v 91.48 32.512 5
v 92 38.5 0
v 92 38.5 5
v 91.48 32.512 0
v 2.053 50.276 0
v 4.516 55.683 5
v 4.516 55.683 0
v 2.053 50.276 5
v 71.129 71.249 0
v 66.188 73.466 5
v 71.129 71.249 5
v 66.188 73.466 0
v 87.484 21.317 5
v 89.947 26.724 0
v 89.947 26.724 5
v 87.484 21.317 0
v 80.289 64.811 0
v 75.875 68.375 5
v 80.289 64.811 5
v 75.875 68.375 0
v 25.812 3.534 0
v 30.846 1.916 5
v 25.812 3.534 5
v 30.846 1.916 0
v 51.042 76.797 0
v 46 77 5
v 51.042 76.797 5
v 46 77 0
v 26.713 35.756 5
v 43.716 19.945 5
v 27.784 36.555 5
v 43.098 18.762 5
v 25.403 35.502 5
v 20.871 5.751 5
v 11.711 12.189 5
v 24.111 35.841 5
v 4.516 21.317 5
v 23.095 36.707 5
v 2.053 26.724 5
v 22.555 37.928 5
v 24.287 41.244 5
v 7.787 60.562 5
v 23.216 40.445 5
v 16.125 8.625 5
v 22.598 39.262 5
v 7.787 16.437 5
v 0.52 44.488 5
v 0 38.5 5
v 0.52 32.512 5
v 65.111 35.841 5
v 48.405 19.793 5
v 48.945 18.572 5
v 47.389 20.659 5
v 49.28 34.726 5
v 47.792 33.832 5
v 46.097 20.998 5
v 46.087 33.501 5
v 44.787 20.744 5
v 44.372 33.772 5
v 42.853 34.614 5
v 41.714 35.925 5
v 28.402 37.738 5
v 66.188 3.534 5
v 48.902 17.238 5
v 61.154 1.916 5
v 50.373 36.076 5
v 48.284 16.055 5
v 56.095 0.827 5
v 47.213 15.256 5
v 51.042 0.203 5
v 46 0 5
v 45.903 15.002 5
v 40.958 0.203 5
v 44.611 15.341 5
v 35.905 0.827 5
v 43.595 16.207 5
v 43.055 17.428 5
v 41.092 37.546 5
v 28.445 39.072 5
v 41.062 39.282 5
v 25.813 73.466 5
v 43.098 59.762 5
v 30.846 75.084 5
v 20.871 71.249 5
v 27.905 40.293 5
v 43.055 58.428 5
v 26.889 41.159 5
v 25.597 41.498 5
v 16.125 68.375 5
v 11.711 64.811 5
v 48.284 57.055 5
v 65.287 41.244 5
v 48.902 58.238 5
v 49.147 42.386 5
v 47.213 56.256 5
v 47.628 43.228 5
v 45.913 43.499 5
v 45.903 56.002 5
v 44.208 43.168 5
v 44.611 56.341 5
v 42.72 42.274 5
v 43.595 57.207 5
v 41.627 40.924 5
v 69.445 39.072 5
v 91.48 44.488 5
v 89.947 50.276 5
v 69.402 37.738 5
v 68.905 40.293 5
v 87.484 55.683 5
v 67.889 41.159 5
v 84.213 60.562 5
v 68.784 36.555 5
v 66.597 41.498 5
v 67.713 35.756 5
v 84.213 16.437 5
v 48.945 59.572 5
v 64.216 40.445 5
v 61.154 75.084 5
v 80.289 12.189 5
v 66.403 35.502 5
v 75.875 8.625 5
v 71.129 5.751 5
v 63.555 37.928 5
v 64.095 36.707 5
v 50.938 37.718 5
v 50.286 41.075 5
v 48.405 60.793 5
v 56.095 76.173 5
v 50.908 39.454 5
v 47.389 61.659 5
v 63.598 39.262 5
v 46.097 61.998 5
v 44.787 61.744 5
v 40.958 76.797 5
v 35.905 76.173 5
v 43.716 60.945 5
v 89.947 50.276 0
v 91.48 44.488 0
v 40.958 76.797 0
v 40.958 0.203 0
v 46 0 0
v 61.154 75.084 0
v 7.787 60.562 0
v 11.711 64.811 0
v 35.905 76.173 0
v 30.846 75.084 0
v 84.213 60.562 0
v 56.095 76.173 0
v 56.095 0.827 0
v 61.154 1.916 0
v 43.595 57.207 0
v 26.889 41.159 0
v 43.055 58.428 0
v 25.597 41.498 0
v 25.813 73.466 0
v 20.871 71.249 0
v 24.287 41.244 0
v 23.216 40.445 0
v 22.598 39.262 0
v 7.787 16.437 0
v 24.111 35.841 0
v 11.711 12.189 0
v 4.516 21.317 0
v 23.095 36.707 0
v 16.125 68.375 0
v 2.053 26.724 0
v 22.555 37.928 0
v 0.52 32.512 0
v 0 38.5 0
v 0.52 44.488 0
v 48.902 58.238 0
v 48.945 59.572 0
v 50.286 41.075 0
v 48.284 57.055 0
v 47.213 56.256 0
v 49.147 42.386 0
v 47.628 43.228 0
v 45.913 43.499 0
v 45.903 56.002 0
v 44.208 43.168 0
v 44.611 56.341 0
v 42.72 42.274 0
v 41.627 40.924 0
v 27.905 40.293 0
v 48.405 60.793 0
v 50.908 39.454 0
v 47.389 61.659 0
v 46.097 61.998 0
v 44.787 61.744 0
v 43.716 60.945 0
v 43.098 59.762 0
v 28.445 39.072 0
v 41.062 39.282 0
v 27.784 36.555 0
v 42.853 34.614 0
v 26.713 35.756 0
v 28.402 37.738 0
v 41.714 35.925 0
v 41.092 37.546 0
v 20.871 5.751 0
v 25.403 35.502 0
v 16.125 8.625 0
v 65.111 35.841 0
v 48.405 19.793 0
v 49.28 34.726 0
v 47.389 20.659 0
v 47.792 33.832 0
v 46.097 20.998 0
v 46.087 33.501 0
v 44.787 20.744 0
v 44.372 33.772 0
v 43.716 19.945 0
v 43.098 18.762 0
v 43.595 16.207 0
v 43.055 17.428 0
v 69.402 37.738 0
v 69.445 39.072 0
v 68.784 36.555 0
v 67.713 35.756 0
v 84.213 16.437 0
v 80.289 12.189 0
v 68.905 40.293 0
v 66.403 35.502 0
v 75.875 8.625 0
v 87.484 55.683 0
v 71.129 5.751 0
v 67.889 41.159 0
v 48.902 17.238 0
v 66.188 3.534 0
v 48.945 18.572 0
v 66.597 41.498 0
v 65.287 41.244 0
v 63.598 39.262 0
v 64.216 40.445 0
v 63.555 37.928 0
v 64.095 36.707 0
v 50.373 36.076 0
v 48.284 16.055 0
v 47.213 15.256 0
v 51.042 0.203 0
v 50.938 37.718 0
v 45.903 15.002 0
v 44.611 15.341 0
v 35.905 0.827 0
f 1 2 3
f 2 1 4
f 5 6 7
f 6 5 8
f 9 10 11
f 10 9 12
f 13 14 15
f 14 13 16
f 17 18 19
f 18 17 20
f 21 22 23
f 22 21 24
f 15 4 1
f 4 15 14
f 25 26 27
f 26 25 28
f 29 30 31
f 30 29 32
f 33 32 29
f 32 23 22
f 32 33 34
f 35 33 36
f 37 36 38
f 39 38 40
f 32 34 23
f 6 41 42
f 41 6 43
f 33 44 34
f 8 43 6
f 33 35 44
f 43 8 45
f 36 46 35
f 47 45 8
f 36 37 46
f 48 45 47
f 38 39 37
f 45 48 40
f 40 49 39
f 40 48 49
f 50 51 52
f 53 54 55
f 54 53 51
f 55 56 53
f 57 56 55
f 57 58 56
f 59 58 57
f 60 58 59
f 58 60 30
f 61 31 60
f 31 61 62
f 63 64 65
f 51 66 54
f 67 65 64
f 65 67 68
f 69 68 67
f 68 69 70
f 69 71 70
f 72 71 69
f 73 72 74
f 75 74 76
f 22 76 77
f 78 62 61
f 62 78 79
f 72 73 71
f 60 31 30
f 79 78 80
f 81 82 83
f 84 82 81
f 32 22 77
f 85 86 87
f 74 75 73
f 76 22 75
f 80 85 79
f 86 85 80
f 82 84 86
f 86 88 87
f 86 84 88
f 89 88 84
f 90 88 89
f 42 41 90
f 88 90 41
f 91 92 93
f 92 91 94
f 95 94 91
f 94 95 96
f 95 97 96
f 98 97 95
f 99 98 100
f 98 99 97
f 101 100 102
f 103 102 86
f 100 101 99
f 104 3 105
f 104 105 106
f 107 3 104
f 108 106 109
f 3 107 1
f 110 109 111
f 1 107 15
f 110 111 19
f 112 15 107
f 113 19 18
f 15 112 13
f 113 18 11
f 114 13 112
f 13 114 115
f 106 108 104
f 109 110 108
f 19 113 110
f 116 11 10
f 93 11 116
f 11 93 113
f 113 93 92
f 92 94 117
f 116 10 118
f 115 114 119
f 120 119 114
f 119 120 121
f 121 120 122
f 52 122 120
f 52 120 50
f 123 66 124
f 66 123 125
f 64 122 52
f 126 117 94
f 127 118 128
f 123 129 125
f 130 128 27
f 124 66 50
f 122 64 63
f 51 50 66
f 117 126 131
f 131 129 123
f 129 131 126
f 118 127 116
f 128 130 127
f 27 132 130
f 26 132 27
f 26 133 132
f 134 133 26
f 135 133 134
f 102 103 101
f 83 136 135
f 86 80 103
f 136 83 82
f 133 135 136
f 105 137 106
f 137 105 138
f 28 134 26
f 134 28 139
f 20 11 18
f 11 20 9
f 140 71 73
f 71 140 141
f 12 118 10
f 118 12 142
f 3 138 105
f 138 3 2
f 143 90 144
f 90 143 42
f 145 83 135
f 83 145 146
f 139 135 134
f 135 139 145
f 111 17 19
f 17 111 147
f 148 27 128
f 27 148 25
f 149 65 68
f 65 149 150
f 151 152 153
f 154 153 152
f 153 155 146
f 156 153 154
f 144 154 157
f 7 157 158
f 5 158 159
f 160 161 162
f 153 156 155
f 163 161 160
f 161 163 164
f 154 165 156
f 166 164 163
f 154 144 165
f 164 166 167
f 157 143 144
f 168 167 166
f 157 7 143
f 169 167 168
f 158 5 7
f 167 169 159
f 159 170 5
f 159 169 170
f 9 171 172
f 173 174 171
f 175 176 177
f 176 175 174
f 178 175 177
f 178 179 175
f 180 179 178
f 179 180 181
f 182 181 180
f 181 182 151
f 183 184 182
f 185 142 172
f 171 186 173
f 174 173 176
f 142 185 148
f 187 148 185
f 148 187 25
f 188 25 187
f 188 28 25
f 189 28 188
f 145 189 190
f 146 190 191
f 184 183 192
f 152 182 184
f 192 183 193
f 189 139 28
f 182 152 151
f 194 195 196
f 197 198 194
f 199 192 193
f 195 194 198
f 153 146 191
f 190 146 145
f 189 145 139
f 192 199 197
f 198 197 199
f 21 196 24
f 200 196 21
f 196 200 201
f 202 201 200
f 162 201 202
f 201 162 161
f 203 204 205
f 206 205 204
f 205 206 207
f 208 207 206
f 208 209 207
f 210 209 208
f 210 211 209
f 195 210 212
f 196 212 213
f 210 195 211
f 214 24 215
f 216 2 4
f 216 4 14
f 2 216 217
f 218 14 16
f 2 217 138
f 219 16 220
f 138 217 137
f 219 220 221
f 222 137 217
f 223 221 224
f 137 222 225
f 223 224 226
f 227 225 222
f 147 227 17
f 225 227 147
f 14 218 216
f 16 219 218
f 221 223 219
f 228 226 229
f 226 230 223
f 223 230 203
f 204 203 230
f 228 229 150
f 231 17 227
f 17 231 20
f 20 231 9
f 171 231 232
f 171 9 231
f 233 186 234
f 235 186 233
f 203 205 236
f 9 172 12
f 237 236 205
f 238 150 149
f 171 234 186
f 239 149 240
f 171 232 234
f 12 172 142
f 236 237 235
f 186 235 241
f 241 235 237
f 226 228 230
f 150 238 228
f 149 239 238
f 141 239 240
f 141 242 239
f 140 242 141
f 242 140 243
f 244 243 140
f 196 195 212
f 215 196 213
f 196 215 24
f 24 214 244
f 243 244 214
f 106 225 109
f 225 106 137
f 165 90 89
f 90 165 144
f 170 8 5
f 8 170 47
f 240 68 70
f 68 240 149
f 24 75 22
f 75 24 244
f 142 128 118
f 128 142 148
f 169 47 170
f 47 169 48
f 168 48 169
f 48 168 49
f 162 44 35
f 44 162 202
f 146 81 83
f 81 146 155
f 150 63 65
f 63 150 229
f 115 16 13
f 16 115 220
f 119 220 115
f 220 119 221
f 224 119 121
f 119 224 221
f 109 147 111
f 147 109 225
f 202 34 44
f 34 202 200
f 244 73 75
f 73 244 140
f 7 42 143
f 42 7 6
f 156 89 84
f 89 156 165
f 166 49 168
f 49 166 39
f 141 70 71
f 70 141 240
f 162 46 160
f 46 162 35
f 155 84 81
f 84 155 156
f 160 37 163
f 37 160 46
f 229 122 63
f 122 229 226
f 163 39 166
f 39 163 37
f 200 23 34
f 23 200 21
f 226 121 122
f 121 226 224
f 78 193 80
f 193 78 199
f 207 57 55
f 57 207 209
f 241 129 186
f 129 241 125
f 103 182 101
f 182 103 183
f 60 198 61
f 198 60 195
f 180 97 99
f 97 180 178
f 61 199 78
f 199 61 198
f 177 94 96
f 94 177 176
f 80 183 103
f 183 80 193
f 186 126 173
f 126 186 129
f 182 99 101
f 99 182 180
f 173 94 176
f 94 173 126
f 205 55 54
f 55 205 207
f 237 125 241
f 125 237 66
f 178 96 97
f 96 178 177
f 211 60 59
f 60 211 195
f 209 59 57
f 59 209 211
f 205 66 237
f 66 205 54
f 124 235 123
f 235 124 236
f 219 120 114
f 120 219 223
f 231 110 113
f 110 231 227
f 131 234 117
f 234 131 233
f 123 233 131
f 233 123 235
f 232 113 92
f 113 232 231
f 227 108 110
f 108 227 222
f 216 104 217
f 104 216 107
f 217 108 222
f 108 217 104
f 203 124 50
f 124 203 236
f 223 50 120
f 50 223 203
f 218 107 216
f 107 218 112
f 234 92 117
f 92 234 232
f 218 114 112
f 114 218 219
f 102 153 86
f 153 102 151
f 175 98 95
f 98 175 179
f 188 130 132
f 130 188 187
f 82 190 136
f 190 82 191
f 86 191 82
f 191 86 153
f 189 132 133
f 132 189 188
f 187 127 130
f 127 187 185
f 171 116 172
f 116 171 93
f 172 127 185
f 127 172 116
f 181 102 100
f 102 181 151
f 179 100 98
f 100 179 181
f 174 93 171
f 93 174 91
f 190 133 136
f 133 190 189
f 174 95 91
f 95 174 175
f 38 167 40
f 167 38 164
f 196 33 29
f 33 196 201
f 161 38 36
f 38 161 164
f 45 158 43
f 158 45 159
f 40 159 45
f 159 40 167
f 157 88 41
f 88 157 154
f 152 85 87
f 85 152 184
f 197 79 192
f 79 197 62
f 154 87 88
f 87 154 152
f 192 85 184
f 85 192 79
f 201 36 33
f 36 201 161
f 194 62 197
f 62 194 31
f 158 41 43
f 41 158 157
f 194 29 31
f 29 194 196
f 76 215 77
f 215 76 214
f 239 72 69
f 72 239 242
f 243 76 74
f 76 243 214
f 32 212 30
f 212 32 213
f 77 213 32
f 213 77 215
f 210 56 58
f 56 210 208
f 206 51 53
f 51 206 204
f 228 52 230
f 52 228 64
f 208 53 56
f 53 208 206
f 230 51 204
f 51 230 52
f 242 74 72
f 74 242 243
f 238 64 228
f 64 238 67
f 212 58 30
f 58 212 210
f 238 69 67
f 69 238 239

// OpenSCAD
$fn = 32;

// ----------------------------------------------------------------------
// Cam plate: double_lobe cam, base R36
// ----------------------------------------------------------------------

// --- parameters (mm) ---
base_r = 36;              // base circle radius
lobe_h = 10;              // cam lobe rise
bore_r = 5;               // shaft bore radius
plate_t = 5;              // plate thickness, Z (extrusion height)
ring_r = 20.5;            // lightening ring radius
bolt_r = 3;               // lightening hole radius

profile = [[92, 38.5], [91.48, 44.488], [89.947, 50.276], [87.484, 55.683], [84.213, 60.562], [80.289, 64.811], [75.875, 68.375], [71.129, 71.249], [66.188, 73.466], [61.154, 75.084], [56.095, 76.173], [51.042, 76.797], [46, 77], [40.958, 76.797], [35.905, 76.173], [30.846, 75.084], [25.813, 73.466], [20.871, 71.249], [16.125, 68.375], [11.711, 64.811], [7.787, 60.562], [4.516, 55.683], [2.053, 50.276], [0.52, 44.488], [0, 38.5], [0.52, 32.512], [2.053, 26.724], [4.516, 21.317], [7.787, 16.437], [11.711, 12.189], [16.125, 8.625], [20.871, 5.751], [25.812, 3.534], [30.846, 1.916], [35.905, 0.827], [40.958, 0.203], [46, 0], [51.042, 0.203], [56.095, 0.827], [61.154, 1.916], [66.188, 3.534], [71.129, 5.751], [75.875, 8.625], [80.289, 12.189], [84.213, 16.437], [87.484, 21.317], [89.947, 26.724], [91.48, 32.512]];  // primary outline, 48 points, counter clockwise
void_1 = [[50.908, 39.454], [50.286, 41.075], [49.147, 42.386], [47.628, 43.228], [45.913, 43.499], [44.208, 43.168], [42.72, 42.274], [41.627, 40.924], [41.062, 39.282], [41.092, 37.546], [41.714, 35.925], [42.853, 34.614], [44.372, 33.772], [46.087, 33.501], [47.792, 33.832], [49.28, 34.726], [50.373, 36.076], [50.938, 37.718]];  // shaft bore, 18 points
void_2 = [[69.445, 39.072], [68.905, 40.293], [67.889, 41.159], [66.597, 41.498], [65.287, 41.244], [64.216, 40.445], [63.598, 39.262], [63.555, 37.928], [64.095, 36.707], [65.111, 35.841], [66.403, 35.502], [67.713, 35.756], [68.784, 36.555], [69.402, 37.738]];  // lightening hole 1, 14 points
void_3 = [[48.945, 59.572], [48.405, 60.793], [47.389, 61.659], [46.097, 61.998], [44.787, 61.744], [43.716, 60.945], [43.098, 59.762], [43.055, 58.428], [43.595, 57.207], [44.611, 56.341], [45.903, 56.002], [47.213, 56.256], [48.284, 57.055], [48.902, 58.238]];  // lightening hole 2, 14 points
void_4 = [[28.445, 39.072], [27.905, 40.293], [26.889, 41.159], [25.597, 41.498], [24.287, 41.244], [23.216, 40.445], [22.598, 39.262], [22.555, 37.928], [23.095, 36.707], [24.111, 35.841], [25.403, 35.502], [26.713, 35.756], [27.784, 36.555], [28.402, 37.738]];  // lightening hole 3, 14 points
void_5 = [[48.945, 18.572], [48.405, 19.793], [47.389, 20.659], [46.097, 20.998], [44.787, 20.744], [43.716, 19.945], [43.098, 18.762], [43.055, 17.428], [43.595, 16.207], [44.611, 15.341], [45.903, 15.002], [47.213, 15.256], [48.284, 16.055], [48.902, 17.238]];  // lightening hole 4, 14 points

// --- the one profile operation ---
difference() {
  linear_extrude(height = plate_t) polygon(points = profile);
  translate([0, 0, -1])
    linear_extrude(height = plate_t + 2) polygon(points = void_1);
  translate([0, 0, -1])
    linear_extrude(height = plate_t + 2) polygon(points = void_2);
  translate([0, 0, -1])
    linear_extrude(height = plate_t + 2) polygon(points = void_3);
  translate([0, 0, -1])
    linear_extrude(height = plate_t + 2) polygon(points = void_4);
  translate([0, 0, -1])
    linear_extrude(height = plate_t + 2) polygon(points = void_5);
}
